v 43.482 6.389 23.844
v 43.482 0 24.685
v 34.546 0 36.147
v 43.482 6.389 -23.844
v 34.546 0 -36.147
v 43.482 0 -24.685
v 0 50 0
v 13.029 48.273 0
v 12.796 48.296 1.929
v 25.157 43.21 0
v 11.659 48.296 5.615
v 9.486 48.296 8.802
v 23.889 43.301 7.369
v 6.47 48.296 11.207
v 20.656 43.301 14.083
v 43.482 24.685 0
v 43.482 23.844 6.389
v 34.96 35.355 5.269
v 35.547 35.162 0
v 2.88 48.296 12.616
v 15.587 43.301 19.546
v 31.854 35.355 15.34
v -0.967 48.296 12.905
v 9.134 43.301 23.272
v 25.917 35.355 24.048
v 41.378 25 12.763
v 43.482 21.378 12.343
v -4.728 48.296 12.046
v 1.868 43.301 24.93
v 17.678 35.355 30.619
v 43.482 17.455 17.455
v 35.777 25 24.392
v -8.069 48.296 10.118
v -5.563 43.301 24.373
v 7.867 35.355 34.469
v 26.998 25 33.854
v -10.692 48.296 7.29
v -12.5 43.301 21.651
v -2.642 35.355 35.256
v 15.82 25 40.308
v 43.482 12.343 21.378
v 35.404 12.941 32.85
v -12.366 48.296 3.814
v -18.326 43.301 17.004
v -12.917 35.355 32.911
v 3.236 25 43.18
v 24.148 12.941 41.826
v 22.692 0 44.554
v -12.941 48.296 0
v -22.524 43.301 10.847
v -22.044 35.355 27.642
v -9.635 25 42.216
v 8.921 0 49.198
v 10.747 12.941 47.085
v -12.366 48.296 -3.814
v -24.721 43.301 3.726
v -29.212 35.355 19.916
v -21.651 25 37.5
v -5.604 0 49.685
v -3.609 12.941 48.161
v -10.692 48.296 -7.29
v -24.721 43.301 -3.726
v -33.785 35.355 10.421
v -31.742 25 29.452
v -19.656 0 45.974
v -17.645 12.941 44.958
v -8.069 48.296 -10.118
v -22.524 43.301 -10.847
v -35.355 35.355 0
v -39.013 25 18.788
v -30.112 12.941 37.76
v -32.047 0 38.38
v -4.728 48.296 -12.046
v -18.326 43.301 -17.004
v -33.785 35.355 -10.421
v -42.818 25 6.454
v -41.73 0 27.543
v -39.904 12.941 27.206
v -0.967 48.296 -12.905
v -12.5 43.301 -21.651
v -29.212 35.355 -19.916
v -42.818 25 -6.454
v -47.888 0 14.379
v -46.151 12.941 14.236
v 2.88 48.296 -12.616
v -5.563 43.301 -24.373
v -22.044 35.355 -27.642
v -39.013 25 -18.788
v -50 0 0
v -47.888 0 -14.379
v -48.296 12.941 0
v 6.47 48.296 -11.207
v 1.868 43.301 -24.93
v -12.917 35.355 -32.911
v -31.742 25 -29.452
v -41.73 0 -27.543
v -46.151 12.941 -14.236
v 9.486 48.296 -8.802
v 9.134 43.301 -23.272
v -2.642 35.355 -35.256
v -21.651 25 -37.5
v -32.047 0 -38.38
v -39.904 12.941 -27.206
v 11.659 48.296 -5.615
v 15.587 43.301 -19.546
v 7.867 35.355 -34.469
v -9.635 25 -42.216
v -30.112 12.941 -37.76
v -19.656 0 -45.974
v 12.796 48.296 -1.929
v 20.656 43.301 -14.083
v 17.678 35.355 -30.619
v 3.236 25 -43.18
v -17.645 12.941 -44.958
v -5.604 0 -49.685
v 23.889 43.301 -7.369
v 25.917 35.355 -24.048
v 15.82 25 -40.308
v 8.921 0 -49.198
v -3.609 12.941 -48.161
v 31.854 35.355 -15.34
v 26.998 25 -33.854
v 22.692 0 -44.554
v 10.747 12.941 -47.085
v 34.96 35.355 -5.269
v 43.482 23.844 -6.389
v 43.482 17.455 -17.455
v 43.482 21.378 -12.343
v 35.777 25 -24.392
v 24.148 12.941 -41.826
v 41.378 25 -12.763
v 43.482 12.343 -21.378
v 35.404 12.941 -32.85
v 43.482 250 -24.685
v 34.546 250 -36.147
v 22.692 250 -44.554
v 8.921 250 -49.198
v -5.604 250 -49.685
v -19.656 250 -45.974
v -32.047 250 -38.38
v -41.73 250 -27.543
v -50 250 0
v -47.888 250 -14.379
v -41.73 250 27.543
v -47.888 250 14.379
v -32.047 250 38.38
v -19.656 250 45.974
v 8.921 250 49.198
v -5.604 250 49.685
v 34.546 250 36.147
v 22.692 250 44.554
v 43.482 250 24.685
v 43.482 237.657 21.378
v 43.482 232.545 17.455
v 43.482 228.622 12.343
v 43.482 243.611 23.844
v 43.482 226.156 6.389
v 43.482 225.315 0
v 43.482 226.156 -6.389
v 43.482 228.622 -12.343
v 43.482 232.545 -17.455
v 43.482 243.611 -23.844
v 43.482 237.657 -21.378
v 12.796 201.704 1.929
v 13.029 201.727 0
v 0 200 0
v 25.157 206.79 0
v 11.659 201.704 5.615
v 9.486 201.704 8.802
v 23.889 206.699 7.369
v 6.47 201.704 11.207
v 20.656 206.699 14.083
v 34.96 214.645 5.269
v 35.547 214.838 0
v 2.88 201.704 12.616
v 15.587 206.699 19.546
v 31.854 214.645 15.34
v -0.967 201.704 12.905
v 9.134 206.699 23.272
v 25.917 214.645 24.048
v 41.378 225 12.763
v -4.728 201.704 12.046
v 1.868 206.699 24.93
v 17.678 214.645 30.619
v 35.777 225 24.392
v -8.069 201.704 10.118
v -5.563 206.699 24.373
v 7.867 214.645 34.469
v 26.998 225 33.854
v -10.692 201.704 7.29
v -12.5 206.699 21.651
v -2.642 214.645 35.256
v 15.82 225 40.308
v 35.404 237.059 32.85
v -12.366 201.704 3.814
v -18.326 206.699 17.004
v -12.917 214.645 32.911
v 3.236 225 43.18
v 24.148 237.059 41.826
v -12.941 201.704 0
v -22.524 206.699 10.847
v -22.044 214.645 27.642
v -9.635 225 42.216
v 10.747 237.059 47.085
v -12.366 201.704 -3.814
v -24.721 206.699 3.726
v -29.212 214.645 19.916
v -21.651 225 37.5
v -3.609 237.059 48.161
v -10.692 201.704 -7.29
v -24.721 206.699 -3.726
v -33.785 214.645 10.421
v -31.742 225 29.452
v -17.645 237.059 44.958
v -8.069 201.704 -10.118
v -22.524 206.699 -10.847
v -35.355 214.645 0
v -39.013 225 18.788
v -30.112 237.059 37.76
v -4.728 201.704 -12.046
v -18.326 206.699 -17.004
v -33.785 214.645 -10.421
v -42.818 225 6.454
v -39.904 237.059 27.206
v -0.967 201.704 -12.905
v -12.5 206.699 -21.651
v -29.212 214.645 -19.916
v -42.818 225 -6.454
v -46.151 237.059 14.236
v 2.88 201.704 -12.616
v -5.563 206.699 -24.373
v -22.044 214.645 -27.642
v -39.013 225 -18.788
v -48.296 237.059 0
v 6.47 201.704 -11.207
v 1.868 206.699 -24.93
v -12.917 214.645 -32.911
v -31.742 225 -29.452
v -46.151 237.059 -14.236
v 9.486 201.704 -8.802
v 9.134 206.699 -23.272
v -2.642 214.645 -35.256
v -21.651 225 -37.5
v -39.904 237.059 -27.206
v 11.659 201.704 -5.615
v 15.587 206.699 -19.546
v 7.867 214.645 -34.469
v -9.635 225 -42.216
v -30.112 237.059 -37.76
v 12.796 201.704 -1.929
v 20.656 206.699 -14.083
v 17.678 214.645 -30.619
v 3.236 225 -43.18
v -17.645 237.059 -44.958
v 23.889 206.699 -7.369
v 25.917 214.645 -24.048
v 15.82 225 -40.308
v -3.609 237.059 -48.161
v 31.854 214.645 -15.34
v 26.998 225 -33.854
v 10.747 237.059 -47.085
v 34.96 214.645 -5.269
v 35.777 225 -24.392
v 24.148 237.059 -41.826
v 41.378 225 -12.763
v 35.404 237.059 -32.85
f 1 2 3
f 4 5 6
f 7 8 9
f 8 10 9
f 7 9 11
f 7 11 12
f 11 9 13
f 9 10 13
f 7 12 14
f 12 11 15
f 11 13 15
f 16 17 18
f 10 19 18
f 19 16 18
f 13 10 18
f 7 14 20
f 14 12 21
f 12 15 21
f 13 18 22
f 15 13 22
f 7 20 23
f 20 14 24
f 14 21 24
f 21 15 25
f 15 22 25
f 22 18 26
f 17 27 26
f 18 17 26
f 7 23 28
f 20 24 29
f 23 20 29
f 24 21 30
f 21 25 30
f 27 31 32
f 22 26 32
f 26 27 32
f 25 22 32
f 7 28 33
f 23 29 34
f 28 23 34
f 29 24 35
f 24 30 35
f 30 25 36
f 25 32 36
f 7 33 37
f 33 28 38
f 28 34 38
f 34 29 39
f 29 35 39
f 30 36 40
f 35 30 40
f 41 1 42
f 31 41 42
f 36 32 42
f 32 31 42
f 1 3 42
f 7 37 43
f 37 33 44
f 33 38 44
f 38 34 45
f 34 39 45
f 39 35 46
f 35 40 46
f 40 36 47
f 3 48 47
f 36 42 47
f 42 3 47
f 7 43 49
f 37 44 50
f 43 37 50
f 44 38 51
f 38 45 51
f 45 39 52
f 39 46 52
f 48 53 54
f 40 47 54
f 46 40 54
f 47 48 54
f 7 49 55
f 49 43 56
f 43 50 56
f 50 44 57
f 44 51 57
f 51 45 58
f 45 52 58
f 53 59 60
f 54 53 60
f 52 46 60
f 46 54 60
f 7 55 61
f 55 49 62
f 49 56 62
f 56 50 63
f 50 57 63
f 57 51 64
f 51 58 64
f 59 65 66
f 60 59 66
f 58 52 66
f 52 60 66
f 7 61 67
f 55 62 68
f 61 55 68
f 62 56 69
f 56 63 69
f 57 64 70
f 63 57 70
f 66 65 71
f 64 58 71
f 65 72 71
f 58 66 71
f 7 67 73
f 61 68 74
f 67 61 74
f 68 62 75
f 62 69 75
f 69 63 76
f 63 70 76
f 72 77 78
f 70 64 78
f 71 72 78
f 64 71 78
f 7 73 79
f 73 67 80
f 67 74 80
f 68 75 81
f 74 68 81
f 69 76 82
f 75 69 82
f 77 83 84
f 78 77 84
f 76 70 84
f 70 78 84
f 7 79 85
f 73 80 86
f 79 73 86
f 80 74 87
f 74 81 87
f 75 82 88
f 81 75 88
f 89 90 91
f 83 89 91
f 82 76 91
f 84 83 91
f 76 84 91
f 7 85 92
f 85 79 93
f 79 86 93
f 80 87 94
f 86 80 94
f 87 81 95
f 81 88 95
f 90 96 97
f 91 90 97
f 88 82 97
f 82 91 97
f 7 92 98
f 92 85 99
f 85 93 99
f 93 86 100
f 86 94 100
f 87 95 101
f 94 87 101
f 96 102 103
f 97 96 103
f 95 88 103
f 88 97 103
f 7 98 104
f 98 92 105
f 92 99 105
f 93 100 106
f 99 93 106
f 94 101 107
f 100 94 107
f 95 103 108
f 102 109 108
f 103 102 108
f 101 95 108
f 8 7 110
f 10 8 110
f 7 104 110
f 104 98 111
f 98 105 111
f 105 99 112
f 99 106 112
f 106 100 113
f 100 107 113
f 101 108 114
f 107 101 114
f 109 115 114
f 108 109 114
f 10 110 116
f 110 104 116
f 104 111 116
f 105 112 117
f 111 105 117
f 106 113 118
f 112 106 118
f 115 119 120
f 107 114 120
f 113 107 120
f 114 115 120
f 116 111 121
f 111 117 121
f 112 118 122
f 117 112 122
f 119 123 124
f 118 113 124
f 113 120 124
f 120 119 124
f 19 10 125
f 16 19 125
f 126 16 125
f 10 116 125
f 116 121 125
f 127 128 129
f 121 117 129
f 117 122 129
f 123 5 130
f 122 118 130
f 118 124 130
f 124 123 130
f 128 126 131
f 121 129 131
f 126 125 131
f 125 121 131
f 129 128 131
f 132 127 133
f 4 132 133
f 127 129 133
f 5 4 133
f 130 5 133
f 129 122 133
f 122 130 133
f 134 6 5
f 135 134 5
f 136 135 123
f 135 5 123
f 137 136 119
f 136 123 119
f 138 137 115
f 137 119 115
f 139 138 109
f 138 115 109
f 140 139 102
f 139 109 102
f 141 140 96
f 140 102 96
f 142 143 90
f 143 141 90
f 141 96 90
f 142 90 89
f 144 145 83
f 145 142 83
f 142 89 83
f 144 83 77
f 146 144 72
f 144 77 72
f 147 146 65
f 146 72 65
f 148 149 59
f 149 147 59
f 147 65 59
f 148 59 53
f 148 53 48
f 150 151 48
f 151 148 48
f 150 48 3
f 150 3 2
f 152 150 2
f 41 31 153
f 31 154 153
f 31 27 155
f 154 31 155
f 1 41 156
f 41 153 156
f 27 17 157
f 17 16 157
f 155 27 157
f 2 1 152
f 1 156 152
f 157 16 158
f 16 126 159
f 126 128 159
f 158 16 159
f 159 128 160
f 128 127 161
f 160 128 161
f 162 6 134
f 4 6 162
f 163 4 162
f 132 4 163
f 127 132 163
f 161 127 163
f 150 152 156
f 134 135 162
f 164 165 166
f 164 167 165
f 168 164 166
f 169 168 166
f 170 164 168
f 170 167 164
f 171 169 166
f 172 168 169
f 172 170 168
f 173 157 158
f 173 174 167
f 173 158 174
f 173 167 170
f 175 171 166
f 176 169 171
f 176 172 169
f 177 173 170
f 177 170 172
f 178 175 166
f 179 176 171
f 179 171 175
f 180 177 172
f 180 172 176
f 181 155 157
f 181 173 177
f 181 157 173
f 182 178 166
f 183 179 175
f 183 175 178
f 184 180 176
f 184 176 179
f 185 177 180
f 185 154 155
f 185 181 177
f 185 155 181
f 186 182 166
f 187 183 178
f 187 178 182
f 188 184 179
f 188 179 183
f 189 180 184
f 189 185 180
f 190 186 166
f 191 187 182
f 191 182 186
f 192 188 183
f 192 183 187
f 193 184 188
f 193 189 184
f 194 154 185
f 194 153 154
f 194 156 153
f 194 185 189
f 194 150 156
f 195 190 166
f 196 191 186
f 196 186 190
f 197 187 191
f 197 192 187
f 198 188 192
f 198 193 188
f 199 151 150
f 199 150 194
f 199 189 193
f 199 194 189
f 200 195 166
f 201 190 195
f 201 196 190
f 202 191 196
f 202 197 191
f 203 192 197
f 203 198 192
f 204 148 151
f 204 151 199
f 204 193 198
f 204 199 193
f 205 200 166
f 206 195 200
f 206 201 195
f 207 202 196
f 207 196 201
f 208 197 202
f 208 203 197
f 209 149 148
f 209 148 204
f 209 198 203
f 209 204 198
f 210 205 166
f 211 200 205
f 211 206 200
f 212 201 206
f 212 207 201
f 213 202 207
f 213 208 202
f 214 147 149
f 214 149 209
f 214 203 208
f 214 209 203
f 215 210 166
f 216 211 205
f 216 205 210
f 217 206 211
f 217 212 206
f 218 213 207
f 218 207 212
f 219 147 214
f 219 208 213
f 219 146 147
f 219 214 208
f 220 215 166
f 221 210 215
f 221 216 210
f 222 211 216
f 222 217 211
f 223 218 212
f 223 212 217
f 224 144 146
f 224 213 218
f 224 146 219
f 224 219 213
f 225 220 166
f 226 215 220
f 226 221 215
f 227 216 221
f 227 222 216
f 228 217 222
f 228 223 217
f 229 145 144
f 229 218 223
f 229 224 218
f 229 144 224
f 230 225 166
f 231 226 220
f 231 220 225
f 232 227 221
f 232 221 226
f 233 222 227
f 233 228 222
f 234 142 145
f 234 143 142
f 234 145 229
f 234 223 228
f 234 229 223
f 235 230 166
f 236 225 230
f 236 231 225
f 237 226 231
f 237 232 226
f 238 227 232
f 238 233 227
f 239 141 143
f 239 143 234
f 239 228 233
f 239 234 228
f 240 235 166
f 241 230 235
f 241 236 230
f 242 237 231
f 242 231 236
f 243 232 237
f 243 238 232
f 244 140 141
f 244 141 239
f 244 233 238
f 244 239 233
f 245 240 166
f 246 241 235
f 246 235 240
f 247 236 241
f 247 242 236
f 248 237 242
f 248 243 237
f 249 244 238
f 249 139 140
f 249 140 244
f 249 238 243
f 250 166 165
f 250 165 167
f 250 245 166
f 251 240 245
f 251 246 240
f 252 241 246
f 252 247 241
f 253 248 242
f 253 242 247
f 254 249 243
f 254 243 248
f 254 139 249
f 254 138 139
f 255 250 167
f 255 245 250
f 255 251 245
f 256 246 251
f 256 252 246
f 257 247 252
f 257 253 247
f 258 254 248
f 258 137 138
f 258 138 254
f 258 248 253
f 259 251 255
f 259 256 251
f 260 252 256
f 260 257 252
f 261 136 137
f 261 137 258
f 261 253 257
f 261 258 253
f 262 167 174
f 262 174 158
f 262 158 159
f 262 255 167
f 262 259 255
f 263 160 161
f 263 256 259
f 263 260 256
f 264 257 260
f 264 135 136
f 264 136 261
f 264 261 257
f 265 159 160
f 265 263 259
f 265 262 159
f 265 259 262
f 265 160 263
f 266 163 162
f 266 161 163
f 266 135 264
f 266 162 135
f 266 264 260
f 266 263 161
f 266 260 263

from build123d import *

# Parameters (mm, degrees)
SKETCH1_R               = 50
BOSS_EXTRUDE1_DEPTH     = 250
CUT_EXTRUDE1_DEPTH      = 260.807621135
CUT_EXTRUDE1_DEPTH_BACK = 260.807621135
SKETCH3_W               = 7.515334491
SKETCH3_H               = 262.678834124


with BuildPart() as part:
    # Sketch1 → Boss-Extrude1 (new body)
    with BuildSketch(Plane(origin=(0, 0, 0), x_dir=(1, 0, 0), z_dir=(0, 1, 0))):
        with Locations(Location((0, 0, 0), (0, 0, 270))):
            Circle(SKETCH1_R)
    extrude(amount=BOSS_EXTRUDE1_DEPTH)

    # Sketch2 → Cut-Revolve1 (revolve, cut)
    with BuildSketch(Plane.XY):
        with BuildLine():
            Line((0, 300), (0, 200))
            ThreePointArc((0, 200), (50, 250), (0, 300))
        make_face()
    cut_revolve1 = revolve(axis=Axis((0, 300, 0), (0, -1, 0)), mode=Mode.SUBTRACT)

    # Mirror2: Cut-Revolve1 across plane
    add(cut_revolve1.mirror(Plane.ZX.offset(125)), mode=Mode.SUBTRACT)

    # Sketch3 → Cut-Extrude1 (cut, two sides: drawn at the far end of the back side and taken through both)
    with BuildSketch(Plane.XY.offset(-CUT_EXTRUDE1_DEPTH_BACK)):
        with Locations((47.239245373, 124.642126929)):
            Rectangle(SKETCH3_W, SKETCH3_H)
    extrude(amount=CUT_EXTRUDE1_DEPTH + CUT_EXTRUDE1_DEPTH_BACK, mode=Mode.SUBTRACT)


solid = part.part
